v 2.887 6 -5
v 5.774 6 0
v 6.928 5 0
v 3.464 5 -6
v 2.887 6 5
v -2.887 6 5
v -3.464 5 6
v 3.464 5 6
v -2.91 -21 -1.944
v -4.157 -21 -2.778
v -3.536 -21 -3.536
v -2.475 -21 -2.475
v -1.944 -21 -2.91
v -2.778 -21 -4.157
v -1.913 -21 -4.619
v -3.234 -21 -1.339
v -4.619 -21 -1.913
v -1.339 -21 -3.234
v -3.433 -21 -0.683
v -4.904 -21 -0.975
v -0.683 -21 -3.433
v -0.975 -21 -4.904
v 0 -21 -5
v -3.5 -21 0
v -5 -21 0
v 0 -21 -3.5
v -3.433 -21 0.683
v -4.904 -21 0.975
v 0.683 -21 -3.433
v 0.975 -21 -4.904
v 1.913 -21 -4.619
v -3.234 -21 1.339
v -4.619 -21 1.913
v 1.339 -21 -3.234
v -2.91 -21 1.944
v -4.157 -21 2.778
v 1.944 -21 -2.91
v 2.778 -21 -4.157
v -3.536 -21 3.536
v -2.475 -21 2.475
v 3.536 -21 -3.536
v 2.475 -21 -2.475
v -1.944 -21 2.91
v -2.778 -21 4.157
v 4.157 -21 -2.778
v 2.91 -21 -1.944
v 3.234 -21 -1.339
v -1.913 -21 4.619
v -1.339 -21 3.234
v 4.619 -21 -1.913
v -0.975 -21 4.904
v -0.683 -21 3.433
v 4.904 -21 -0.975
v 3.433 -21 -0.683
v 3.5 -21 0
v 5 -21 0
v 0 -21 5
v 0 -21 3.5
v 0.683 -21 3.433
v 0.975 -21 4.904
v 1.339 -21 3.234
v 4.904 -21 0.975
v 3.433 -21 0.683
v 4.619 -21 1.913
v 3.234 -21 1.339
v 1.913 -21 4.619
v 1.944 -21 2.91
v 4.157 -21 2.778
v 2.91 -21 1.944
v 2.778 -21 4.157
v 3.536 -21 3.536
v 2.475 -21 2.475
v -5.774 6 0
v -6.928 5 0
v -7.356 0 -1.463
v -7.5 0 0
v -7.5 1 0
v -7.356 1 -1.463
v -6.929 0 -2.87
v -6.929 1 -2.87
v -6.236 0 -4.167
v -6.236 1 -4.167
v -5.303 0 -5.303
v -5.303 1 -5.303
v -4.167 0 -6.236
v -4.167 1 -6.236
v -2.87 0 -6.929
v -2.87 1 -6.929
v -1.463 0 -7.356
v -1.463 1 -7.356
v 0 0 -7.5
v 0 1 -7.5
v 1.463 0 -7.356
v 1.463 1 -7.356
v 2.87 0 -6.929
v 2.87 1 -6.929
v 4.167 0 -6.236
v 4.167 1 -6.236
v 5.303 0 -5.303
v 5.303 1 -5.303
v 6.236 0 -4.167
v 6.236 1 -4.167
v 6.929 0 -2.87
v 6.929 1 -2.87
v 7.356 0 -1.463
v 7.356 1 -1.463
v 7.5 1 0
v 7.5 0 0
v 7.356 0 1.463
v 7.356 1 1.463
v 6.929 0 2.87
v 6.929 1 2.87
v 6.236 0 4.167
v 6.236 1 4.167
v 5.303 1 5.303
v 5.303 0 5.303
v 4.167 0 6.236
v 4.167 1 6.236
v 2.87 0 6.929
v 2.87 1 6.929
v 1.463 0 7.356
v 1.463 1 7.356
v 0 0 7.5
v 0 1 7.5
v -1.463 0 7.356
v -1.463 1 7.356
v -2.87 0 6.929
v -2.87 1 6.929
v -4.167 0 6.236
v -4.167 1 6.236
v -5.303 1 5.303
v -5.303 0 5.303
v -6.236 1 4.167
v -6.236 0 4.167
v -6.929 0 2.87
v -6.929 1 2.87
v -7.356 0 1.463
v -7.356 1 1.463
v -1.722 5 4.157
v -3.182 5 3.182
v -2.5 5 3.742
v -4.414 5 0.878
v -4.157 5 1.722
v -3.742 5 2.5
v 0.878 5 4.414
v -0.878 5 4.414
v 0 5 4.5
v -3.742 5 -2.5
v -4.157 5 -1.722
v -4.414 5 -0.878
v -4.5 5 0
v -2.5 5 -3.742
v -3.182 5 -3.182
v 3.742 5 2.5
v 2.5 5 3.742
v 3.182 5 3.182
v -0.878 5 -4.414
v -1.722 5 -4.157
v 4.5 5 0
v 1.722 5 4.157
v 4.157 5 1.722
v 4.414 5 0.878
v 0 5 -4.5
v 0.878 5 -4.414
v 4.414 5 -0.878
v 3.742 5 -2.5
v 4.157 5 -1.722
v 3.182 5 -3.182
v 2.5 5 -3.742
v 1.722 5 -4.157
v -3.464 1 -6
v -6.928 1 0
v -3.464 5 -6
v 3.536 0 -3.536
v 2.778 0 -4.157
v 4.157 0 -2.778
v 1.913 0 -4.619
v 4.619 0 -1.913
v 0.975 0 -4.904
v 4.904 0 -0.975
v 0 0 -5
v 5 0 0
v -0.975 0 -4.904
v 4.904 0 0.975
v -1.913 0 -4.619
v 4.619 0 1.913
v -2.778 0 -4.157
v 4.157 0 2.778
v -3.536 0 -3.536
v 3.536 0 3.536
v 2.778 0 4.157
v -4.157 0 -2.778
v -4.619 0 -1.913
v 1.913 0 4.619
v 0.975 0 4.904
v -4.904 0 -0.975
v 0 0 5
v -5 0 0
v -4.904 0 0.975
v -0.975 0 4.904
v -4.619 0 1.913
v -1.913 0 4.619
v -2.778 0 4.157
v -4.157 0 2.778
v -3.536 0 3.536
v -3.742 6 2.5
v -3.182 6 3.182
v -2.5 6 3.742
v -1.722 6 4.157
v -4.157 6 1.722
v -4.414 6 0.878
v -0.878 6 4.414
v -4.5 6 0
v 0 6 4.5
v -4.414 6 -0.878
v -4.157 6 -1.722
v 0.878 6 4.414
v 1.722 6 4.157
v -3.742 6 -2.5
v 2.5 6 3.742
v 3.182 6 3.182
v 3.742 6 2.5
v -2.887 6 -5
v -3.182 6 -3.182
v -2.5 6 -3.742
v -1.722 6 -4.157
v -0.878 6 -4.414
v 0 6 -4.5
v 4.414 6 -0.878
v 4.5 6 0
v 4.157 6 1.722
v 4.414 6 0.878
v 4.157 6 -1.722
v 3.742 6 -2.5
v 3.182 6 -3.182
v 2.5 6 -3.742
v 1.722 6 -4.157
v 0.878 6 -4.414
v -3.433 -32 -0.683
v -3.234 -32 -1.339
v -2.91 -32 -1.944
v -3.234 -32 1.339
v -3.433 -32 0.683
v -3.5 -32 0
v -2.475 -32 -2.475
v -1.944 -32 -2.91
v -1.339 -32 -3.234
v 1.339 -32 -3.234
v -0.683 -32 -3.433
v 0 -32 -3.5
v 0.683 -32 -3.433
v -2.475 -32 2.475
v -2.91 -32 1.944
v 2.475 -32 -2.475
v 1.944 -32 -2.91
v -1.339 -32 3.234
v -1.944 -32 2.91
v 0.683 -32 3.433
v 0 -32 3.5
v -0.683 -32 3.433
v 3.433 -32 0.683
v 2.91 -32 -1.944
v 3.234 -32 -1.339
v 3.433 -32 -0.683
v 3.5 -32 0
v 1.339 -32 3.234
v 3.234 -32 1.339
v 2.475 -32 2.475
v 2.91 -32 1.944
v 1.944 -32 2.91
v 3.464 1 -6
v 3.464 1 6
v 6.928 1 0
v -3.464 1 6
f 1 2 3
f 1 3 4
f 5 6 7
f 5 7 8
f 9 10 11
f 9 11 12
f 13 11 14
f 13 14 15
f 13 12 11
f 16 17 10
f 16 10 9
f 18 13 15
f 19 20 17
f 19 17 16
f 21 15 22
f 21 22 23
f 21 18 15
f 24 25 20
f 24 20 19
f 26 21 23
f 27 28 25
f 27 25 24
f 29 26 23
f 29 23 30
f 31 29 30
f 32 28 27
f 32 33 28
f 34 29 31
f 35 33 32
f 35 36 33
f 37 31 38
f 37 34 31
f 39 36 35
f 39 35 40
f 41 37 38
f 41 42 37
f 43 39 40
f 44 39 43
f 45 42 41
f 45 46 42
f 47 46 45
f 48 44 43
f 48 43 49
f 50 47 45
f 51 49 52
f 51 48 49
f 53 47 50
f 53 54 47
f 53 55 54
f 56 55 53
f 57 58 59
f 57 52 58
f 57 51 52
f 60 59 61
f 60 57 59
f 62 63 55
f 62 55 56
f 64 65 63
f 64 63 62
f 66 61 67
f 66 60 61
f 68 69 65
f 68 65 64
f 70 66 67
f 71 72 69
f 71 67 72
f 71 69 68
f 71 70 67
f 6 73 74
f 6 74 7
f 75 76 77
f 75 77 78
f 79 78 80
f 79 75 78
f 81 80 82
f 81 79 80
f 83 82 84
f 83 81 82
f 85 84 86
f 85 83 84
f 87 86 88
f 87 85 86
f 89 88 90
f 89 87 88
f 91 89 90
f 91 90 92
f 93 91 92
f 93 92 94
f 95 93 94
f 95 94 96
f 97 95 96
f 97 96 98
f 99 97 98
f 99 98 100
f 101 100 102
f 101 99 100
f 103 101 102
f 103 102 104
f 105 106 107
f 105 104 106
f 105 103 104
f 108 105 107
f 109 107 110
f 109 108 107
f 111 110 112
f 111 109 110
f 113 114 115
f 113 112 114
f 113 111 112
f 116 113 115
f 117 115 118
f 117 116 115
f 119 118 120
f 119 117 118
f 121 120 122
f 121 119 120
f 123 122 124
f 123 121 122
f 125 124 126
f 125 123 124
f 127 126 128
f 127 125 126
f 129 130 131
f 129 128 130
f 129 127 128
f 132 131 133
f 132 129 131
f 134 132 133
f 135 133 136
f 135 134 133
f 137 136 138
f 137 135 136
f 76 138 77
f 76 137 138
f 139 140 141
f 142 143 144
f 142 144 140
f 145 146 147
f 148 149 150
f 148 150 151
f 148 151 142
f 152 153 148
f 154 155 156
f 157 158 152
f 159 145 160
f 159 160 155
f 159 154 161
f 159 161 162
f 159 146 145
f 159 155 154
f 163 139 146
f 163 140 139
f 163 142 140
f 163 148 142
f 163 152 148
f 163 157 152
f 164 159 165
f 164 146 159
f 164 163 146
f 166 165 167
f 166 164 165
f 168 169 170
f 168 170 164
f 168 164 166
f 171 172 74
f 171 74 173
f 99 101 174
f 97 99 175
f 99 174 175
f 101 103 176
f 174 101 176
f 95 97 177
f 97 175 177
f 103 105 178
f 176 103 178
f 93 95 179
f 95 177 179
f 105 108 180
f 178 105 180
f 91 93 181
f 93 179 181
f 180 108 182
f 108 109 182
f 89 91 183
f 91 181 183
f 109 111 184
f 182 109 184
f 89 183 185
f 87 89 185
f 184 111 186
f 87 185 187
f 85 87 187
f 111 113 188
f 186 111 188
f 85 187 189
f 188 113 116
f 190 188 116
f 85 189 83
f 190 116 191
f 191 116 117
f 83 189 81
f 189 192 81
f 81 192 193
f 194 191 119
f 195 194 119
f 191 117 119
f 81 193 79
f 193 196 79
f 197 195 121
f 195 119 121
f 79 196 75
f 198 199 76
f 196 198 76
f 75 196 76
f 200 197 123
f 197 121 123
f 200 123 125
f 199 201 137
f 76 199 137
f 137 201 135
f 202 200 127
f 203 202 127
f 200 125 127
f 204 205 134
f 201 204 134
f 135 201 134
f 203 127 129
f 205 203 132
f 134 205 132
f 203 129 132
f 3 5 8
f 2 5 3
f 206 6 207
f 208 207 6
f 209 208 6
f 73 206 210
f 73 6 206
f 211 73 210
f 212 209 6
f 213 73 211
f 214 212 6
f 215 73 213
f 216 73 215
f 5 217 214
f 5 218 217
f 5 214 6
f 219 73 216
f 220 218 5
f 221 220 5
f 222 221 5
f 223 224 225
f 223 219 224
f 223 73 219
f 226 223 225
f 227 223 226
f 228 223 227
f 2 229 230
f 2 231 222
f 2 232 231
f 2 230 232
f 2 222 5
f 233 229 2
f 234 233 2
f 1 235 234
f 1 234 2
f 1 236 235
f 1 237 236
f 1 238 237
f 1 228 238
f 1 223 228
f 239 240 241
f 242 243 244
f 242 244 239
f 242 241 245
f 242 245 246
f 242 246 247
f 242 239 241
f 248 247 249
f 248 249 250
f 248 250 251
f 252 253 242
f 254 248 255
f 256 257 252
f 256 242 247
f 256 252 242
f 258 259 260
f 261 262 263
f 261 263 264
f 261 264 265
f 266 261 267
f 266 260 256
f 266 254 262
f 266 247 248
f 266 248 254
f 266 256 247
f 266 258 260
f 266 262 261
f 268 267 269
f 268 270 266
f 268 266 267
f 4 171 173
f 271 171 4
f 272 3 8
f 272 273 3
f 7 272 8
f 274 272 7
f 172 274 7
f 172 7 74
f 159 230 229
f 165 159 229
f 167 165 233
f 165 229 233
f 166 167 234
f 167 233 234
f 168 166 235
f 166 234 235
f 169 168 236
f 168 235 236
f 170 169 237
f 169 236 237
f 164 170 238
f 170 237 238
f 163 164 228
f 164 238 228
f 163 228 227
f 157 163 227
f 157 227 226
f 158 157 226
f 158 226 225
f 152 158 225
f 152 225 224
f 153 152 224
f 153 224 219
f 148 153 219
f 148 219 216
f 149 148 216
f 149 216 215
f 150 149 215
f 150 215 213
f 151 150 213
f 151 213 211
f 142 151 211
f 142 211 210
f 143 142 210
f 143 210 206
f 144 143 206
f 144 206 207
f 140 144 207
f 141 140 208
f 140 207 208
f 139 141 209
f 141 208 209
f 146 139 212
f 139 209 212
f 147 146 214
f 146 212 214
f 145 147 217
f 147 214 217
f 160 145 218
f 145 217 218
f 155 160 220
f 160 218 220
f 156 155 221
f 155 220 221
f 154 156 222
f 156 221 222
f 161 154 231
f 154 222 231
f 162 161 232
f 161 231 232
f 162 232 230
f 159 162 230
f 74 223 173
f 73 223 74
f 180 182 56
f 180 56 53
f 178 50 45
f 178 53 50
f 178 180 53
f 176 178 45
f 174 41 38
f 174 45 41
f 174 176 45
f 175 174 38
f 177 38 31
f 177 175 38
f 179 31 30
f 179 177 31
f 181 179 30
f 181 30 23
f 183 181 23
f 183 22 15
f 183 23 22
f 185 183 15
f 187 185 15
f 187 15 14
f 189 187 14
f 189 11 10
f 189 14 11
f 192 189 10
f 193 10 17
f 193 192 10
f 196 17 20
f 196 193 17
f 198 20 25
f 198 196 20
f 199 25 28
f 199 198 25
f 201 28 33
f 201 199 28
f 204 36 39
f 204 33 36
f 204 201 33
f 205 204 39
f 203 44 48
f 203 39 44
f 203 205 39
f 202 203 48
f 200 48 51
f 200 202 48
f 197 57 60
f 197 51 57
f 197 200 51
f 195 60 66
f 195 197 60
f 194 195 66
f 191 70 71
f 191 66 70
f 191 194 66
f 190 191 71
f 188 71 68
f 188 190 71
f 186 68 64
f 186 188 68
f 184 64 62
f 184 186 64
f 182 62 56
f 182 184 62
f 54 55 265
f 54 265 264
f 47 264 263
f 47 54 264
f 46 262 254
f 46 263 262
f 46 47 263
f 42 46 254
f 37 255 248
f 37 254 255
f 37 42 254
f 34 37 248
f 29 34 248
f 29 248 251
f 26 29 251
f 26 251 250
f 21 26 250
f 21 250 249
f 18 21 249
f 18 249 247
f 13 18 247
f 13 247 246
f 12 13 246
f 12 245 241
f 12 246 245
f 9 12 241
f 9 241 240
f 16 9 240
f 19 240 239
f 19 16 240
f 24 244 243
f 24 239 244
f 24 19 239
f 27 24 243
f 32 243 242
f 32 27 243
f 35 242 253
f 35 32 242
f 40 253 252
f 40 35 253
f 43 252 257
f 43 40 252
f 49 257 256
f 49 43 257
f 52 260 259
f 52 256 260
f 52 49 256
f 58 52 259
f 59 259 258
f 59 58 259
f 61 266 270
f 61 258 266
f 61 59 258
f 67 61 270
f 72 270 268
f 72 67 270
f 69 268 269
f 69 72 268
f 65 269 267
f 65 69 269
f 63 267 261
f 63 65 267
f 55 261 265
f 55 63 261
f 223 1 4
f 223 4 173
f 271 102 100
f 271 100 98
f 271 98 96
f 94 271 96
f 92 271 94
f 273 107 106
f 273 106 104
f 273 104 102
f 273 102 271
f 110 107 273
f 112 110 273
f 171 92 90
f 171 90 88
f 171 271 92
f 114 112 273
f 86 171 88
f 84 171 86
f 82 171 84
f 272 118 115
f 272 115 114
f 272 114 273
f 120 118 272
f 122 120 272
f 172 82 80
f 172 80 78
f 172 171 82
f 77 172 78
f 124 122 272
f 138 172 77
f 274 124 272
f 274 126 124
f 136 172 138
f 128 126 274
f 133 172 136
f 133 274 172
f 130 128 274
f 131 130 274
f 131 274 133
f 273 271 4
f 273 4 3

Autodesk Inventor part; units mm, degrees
ref_plane "YZ Plane" through (0, 0, 0) normal (1, 0, 0) x (0, 1, 0)
ref_plane "XZ Plane" through (0, 0, 0) normal (0, 1, 0) x (-1, 0, 0)
ref_plane "XY Plane" through (0, 0, 0) normal (0, 0, 1) x (1, 0, 0)
sketch "Boceto1" plane through (0, 0, 0) normal (0, 1, 0) x (-1, 0, 0)
  circle A0 centre (0, 0) radius 7.5
  dimension "d0" = 15
extrude "Extrusión1" add sketch "Boceto1" along normal blind 1
sketch "Boceto2" plane through (0, 1, 0) normal (0, 1, 0) x (1, 0, 0)
  line L0 (-3.4641, 6) -> (3.4641, 6)
  line L1 (3.4641, 6) -> (6.9282, 0)
  line L2 (6.9282, 0) -> (3.4641, -6)
  line L3 (3.4641, -6) -> (-3.4641, -6)
  line L4 (-3.4641, -6) -> (-6.9282, 0)
  line L5 (-6.9282, 0) -> (-3.4641, 6)
  point P0 (0, 0)
  point P1 (0, 0)
  dimension "d3" = 6
  dimension "d4" = 0
extrude "Extrusión2" add sketch "Boceto2" along normal blind 5
sketch "Boceto3" plane through (0, 0, 0) normal (0, -1, 0) x (1, 0, 0)
  circle A0 centre (0, 0) radius 5
  dimension "d7" = 10
extrude "Extrusión3" add sketch "Boceto3" along normal blind 21
sketch "Boceto5" plane through (0, -21, 0) normal (0, -1, 0) x (1, 0, 0)
  circle A0 centre (0, 0) radius 3.5
  dimension "d15" = 7
extrude "Extrusión4" add sketch "Boceto5" along normal blind 11
thread "Rosca2" size "M7x1" class "6g" standard "ANSI Metric M Profile" length 10
chamfer "Chaflán1" distance 1 angle 45 6 edges at (-5.1962, 6, -3) (0, 6, -6) (5.1962, 6, -3) (5.1962, 6, 3) (0, 6, 6) (-5.1962, 6, 3)
sketch "Boceto6" plane through (0, 6, 0) normal (0, 1, 0) x (1, 0, 0)
  circle A0 centre (0, 0) radius 4.5
  dimension "d23" = 9
extrude "Extrusión5" cut sketch "Boceto6" against normal blind 1
properties part number "BASE_PERNO"
